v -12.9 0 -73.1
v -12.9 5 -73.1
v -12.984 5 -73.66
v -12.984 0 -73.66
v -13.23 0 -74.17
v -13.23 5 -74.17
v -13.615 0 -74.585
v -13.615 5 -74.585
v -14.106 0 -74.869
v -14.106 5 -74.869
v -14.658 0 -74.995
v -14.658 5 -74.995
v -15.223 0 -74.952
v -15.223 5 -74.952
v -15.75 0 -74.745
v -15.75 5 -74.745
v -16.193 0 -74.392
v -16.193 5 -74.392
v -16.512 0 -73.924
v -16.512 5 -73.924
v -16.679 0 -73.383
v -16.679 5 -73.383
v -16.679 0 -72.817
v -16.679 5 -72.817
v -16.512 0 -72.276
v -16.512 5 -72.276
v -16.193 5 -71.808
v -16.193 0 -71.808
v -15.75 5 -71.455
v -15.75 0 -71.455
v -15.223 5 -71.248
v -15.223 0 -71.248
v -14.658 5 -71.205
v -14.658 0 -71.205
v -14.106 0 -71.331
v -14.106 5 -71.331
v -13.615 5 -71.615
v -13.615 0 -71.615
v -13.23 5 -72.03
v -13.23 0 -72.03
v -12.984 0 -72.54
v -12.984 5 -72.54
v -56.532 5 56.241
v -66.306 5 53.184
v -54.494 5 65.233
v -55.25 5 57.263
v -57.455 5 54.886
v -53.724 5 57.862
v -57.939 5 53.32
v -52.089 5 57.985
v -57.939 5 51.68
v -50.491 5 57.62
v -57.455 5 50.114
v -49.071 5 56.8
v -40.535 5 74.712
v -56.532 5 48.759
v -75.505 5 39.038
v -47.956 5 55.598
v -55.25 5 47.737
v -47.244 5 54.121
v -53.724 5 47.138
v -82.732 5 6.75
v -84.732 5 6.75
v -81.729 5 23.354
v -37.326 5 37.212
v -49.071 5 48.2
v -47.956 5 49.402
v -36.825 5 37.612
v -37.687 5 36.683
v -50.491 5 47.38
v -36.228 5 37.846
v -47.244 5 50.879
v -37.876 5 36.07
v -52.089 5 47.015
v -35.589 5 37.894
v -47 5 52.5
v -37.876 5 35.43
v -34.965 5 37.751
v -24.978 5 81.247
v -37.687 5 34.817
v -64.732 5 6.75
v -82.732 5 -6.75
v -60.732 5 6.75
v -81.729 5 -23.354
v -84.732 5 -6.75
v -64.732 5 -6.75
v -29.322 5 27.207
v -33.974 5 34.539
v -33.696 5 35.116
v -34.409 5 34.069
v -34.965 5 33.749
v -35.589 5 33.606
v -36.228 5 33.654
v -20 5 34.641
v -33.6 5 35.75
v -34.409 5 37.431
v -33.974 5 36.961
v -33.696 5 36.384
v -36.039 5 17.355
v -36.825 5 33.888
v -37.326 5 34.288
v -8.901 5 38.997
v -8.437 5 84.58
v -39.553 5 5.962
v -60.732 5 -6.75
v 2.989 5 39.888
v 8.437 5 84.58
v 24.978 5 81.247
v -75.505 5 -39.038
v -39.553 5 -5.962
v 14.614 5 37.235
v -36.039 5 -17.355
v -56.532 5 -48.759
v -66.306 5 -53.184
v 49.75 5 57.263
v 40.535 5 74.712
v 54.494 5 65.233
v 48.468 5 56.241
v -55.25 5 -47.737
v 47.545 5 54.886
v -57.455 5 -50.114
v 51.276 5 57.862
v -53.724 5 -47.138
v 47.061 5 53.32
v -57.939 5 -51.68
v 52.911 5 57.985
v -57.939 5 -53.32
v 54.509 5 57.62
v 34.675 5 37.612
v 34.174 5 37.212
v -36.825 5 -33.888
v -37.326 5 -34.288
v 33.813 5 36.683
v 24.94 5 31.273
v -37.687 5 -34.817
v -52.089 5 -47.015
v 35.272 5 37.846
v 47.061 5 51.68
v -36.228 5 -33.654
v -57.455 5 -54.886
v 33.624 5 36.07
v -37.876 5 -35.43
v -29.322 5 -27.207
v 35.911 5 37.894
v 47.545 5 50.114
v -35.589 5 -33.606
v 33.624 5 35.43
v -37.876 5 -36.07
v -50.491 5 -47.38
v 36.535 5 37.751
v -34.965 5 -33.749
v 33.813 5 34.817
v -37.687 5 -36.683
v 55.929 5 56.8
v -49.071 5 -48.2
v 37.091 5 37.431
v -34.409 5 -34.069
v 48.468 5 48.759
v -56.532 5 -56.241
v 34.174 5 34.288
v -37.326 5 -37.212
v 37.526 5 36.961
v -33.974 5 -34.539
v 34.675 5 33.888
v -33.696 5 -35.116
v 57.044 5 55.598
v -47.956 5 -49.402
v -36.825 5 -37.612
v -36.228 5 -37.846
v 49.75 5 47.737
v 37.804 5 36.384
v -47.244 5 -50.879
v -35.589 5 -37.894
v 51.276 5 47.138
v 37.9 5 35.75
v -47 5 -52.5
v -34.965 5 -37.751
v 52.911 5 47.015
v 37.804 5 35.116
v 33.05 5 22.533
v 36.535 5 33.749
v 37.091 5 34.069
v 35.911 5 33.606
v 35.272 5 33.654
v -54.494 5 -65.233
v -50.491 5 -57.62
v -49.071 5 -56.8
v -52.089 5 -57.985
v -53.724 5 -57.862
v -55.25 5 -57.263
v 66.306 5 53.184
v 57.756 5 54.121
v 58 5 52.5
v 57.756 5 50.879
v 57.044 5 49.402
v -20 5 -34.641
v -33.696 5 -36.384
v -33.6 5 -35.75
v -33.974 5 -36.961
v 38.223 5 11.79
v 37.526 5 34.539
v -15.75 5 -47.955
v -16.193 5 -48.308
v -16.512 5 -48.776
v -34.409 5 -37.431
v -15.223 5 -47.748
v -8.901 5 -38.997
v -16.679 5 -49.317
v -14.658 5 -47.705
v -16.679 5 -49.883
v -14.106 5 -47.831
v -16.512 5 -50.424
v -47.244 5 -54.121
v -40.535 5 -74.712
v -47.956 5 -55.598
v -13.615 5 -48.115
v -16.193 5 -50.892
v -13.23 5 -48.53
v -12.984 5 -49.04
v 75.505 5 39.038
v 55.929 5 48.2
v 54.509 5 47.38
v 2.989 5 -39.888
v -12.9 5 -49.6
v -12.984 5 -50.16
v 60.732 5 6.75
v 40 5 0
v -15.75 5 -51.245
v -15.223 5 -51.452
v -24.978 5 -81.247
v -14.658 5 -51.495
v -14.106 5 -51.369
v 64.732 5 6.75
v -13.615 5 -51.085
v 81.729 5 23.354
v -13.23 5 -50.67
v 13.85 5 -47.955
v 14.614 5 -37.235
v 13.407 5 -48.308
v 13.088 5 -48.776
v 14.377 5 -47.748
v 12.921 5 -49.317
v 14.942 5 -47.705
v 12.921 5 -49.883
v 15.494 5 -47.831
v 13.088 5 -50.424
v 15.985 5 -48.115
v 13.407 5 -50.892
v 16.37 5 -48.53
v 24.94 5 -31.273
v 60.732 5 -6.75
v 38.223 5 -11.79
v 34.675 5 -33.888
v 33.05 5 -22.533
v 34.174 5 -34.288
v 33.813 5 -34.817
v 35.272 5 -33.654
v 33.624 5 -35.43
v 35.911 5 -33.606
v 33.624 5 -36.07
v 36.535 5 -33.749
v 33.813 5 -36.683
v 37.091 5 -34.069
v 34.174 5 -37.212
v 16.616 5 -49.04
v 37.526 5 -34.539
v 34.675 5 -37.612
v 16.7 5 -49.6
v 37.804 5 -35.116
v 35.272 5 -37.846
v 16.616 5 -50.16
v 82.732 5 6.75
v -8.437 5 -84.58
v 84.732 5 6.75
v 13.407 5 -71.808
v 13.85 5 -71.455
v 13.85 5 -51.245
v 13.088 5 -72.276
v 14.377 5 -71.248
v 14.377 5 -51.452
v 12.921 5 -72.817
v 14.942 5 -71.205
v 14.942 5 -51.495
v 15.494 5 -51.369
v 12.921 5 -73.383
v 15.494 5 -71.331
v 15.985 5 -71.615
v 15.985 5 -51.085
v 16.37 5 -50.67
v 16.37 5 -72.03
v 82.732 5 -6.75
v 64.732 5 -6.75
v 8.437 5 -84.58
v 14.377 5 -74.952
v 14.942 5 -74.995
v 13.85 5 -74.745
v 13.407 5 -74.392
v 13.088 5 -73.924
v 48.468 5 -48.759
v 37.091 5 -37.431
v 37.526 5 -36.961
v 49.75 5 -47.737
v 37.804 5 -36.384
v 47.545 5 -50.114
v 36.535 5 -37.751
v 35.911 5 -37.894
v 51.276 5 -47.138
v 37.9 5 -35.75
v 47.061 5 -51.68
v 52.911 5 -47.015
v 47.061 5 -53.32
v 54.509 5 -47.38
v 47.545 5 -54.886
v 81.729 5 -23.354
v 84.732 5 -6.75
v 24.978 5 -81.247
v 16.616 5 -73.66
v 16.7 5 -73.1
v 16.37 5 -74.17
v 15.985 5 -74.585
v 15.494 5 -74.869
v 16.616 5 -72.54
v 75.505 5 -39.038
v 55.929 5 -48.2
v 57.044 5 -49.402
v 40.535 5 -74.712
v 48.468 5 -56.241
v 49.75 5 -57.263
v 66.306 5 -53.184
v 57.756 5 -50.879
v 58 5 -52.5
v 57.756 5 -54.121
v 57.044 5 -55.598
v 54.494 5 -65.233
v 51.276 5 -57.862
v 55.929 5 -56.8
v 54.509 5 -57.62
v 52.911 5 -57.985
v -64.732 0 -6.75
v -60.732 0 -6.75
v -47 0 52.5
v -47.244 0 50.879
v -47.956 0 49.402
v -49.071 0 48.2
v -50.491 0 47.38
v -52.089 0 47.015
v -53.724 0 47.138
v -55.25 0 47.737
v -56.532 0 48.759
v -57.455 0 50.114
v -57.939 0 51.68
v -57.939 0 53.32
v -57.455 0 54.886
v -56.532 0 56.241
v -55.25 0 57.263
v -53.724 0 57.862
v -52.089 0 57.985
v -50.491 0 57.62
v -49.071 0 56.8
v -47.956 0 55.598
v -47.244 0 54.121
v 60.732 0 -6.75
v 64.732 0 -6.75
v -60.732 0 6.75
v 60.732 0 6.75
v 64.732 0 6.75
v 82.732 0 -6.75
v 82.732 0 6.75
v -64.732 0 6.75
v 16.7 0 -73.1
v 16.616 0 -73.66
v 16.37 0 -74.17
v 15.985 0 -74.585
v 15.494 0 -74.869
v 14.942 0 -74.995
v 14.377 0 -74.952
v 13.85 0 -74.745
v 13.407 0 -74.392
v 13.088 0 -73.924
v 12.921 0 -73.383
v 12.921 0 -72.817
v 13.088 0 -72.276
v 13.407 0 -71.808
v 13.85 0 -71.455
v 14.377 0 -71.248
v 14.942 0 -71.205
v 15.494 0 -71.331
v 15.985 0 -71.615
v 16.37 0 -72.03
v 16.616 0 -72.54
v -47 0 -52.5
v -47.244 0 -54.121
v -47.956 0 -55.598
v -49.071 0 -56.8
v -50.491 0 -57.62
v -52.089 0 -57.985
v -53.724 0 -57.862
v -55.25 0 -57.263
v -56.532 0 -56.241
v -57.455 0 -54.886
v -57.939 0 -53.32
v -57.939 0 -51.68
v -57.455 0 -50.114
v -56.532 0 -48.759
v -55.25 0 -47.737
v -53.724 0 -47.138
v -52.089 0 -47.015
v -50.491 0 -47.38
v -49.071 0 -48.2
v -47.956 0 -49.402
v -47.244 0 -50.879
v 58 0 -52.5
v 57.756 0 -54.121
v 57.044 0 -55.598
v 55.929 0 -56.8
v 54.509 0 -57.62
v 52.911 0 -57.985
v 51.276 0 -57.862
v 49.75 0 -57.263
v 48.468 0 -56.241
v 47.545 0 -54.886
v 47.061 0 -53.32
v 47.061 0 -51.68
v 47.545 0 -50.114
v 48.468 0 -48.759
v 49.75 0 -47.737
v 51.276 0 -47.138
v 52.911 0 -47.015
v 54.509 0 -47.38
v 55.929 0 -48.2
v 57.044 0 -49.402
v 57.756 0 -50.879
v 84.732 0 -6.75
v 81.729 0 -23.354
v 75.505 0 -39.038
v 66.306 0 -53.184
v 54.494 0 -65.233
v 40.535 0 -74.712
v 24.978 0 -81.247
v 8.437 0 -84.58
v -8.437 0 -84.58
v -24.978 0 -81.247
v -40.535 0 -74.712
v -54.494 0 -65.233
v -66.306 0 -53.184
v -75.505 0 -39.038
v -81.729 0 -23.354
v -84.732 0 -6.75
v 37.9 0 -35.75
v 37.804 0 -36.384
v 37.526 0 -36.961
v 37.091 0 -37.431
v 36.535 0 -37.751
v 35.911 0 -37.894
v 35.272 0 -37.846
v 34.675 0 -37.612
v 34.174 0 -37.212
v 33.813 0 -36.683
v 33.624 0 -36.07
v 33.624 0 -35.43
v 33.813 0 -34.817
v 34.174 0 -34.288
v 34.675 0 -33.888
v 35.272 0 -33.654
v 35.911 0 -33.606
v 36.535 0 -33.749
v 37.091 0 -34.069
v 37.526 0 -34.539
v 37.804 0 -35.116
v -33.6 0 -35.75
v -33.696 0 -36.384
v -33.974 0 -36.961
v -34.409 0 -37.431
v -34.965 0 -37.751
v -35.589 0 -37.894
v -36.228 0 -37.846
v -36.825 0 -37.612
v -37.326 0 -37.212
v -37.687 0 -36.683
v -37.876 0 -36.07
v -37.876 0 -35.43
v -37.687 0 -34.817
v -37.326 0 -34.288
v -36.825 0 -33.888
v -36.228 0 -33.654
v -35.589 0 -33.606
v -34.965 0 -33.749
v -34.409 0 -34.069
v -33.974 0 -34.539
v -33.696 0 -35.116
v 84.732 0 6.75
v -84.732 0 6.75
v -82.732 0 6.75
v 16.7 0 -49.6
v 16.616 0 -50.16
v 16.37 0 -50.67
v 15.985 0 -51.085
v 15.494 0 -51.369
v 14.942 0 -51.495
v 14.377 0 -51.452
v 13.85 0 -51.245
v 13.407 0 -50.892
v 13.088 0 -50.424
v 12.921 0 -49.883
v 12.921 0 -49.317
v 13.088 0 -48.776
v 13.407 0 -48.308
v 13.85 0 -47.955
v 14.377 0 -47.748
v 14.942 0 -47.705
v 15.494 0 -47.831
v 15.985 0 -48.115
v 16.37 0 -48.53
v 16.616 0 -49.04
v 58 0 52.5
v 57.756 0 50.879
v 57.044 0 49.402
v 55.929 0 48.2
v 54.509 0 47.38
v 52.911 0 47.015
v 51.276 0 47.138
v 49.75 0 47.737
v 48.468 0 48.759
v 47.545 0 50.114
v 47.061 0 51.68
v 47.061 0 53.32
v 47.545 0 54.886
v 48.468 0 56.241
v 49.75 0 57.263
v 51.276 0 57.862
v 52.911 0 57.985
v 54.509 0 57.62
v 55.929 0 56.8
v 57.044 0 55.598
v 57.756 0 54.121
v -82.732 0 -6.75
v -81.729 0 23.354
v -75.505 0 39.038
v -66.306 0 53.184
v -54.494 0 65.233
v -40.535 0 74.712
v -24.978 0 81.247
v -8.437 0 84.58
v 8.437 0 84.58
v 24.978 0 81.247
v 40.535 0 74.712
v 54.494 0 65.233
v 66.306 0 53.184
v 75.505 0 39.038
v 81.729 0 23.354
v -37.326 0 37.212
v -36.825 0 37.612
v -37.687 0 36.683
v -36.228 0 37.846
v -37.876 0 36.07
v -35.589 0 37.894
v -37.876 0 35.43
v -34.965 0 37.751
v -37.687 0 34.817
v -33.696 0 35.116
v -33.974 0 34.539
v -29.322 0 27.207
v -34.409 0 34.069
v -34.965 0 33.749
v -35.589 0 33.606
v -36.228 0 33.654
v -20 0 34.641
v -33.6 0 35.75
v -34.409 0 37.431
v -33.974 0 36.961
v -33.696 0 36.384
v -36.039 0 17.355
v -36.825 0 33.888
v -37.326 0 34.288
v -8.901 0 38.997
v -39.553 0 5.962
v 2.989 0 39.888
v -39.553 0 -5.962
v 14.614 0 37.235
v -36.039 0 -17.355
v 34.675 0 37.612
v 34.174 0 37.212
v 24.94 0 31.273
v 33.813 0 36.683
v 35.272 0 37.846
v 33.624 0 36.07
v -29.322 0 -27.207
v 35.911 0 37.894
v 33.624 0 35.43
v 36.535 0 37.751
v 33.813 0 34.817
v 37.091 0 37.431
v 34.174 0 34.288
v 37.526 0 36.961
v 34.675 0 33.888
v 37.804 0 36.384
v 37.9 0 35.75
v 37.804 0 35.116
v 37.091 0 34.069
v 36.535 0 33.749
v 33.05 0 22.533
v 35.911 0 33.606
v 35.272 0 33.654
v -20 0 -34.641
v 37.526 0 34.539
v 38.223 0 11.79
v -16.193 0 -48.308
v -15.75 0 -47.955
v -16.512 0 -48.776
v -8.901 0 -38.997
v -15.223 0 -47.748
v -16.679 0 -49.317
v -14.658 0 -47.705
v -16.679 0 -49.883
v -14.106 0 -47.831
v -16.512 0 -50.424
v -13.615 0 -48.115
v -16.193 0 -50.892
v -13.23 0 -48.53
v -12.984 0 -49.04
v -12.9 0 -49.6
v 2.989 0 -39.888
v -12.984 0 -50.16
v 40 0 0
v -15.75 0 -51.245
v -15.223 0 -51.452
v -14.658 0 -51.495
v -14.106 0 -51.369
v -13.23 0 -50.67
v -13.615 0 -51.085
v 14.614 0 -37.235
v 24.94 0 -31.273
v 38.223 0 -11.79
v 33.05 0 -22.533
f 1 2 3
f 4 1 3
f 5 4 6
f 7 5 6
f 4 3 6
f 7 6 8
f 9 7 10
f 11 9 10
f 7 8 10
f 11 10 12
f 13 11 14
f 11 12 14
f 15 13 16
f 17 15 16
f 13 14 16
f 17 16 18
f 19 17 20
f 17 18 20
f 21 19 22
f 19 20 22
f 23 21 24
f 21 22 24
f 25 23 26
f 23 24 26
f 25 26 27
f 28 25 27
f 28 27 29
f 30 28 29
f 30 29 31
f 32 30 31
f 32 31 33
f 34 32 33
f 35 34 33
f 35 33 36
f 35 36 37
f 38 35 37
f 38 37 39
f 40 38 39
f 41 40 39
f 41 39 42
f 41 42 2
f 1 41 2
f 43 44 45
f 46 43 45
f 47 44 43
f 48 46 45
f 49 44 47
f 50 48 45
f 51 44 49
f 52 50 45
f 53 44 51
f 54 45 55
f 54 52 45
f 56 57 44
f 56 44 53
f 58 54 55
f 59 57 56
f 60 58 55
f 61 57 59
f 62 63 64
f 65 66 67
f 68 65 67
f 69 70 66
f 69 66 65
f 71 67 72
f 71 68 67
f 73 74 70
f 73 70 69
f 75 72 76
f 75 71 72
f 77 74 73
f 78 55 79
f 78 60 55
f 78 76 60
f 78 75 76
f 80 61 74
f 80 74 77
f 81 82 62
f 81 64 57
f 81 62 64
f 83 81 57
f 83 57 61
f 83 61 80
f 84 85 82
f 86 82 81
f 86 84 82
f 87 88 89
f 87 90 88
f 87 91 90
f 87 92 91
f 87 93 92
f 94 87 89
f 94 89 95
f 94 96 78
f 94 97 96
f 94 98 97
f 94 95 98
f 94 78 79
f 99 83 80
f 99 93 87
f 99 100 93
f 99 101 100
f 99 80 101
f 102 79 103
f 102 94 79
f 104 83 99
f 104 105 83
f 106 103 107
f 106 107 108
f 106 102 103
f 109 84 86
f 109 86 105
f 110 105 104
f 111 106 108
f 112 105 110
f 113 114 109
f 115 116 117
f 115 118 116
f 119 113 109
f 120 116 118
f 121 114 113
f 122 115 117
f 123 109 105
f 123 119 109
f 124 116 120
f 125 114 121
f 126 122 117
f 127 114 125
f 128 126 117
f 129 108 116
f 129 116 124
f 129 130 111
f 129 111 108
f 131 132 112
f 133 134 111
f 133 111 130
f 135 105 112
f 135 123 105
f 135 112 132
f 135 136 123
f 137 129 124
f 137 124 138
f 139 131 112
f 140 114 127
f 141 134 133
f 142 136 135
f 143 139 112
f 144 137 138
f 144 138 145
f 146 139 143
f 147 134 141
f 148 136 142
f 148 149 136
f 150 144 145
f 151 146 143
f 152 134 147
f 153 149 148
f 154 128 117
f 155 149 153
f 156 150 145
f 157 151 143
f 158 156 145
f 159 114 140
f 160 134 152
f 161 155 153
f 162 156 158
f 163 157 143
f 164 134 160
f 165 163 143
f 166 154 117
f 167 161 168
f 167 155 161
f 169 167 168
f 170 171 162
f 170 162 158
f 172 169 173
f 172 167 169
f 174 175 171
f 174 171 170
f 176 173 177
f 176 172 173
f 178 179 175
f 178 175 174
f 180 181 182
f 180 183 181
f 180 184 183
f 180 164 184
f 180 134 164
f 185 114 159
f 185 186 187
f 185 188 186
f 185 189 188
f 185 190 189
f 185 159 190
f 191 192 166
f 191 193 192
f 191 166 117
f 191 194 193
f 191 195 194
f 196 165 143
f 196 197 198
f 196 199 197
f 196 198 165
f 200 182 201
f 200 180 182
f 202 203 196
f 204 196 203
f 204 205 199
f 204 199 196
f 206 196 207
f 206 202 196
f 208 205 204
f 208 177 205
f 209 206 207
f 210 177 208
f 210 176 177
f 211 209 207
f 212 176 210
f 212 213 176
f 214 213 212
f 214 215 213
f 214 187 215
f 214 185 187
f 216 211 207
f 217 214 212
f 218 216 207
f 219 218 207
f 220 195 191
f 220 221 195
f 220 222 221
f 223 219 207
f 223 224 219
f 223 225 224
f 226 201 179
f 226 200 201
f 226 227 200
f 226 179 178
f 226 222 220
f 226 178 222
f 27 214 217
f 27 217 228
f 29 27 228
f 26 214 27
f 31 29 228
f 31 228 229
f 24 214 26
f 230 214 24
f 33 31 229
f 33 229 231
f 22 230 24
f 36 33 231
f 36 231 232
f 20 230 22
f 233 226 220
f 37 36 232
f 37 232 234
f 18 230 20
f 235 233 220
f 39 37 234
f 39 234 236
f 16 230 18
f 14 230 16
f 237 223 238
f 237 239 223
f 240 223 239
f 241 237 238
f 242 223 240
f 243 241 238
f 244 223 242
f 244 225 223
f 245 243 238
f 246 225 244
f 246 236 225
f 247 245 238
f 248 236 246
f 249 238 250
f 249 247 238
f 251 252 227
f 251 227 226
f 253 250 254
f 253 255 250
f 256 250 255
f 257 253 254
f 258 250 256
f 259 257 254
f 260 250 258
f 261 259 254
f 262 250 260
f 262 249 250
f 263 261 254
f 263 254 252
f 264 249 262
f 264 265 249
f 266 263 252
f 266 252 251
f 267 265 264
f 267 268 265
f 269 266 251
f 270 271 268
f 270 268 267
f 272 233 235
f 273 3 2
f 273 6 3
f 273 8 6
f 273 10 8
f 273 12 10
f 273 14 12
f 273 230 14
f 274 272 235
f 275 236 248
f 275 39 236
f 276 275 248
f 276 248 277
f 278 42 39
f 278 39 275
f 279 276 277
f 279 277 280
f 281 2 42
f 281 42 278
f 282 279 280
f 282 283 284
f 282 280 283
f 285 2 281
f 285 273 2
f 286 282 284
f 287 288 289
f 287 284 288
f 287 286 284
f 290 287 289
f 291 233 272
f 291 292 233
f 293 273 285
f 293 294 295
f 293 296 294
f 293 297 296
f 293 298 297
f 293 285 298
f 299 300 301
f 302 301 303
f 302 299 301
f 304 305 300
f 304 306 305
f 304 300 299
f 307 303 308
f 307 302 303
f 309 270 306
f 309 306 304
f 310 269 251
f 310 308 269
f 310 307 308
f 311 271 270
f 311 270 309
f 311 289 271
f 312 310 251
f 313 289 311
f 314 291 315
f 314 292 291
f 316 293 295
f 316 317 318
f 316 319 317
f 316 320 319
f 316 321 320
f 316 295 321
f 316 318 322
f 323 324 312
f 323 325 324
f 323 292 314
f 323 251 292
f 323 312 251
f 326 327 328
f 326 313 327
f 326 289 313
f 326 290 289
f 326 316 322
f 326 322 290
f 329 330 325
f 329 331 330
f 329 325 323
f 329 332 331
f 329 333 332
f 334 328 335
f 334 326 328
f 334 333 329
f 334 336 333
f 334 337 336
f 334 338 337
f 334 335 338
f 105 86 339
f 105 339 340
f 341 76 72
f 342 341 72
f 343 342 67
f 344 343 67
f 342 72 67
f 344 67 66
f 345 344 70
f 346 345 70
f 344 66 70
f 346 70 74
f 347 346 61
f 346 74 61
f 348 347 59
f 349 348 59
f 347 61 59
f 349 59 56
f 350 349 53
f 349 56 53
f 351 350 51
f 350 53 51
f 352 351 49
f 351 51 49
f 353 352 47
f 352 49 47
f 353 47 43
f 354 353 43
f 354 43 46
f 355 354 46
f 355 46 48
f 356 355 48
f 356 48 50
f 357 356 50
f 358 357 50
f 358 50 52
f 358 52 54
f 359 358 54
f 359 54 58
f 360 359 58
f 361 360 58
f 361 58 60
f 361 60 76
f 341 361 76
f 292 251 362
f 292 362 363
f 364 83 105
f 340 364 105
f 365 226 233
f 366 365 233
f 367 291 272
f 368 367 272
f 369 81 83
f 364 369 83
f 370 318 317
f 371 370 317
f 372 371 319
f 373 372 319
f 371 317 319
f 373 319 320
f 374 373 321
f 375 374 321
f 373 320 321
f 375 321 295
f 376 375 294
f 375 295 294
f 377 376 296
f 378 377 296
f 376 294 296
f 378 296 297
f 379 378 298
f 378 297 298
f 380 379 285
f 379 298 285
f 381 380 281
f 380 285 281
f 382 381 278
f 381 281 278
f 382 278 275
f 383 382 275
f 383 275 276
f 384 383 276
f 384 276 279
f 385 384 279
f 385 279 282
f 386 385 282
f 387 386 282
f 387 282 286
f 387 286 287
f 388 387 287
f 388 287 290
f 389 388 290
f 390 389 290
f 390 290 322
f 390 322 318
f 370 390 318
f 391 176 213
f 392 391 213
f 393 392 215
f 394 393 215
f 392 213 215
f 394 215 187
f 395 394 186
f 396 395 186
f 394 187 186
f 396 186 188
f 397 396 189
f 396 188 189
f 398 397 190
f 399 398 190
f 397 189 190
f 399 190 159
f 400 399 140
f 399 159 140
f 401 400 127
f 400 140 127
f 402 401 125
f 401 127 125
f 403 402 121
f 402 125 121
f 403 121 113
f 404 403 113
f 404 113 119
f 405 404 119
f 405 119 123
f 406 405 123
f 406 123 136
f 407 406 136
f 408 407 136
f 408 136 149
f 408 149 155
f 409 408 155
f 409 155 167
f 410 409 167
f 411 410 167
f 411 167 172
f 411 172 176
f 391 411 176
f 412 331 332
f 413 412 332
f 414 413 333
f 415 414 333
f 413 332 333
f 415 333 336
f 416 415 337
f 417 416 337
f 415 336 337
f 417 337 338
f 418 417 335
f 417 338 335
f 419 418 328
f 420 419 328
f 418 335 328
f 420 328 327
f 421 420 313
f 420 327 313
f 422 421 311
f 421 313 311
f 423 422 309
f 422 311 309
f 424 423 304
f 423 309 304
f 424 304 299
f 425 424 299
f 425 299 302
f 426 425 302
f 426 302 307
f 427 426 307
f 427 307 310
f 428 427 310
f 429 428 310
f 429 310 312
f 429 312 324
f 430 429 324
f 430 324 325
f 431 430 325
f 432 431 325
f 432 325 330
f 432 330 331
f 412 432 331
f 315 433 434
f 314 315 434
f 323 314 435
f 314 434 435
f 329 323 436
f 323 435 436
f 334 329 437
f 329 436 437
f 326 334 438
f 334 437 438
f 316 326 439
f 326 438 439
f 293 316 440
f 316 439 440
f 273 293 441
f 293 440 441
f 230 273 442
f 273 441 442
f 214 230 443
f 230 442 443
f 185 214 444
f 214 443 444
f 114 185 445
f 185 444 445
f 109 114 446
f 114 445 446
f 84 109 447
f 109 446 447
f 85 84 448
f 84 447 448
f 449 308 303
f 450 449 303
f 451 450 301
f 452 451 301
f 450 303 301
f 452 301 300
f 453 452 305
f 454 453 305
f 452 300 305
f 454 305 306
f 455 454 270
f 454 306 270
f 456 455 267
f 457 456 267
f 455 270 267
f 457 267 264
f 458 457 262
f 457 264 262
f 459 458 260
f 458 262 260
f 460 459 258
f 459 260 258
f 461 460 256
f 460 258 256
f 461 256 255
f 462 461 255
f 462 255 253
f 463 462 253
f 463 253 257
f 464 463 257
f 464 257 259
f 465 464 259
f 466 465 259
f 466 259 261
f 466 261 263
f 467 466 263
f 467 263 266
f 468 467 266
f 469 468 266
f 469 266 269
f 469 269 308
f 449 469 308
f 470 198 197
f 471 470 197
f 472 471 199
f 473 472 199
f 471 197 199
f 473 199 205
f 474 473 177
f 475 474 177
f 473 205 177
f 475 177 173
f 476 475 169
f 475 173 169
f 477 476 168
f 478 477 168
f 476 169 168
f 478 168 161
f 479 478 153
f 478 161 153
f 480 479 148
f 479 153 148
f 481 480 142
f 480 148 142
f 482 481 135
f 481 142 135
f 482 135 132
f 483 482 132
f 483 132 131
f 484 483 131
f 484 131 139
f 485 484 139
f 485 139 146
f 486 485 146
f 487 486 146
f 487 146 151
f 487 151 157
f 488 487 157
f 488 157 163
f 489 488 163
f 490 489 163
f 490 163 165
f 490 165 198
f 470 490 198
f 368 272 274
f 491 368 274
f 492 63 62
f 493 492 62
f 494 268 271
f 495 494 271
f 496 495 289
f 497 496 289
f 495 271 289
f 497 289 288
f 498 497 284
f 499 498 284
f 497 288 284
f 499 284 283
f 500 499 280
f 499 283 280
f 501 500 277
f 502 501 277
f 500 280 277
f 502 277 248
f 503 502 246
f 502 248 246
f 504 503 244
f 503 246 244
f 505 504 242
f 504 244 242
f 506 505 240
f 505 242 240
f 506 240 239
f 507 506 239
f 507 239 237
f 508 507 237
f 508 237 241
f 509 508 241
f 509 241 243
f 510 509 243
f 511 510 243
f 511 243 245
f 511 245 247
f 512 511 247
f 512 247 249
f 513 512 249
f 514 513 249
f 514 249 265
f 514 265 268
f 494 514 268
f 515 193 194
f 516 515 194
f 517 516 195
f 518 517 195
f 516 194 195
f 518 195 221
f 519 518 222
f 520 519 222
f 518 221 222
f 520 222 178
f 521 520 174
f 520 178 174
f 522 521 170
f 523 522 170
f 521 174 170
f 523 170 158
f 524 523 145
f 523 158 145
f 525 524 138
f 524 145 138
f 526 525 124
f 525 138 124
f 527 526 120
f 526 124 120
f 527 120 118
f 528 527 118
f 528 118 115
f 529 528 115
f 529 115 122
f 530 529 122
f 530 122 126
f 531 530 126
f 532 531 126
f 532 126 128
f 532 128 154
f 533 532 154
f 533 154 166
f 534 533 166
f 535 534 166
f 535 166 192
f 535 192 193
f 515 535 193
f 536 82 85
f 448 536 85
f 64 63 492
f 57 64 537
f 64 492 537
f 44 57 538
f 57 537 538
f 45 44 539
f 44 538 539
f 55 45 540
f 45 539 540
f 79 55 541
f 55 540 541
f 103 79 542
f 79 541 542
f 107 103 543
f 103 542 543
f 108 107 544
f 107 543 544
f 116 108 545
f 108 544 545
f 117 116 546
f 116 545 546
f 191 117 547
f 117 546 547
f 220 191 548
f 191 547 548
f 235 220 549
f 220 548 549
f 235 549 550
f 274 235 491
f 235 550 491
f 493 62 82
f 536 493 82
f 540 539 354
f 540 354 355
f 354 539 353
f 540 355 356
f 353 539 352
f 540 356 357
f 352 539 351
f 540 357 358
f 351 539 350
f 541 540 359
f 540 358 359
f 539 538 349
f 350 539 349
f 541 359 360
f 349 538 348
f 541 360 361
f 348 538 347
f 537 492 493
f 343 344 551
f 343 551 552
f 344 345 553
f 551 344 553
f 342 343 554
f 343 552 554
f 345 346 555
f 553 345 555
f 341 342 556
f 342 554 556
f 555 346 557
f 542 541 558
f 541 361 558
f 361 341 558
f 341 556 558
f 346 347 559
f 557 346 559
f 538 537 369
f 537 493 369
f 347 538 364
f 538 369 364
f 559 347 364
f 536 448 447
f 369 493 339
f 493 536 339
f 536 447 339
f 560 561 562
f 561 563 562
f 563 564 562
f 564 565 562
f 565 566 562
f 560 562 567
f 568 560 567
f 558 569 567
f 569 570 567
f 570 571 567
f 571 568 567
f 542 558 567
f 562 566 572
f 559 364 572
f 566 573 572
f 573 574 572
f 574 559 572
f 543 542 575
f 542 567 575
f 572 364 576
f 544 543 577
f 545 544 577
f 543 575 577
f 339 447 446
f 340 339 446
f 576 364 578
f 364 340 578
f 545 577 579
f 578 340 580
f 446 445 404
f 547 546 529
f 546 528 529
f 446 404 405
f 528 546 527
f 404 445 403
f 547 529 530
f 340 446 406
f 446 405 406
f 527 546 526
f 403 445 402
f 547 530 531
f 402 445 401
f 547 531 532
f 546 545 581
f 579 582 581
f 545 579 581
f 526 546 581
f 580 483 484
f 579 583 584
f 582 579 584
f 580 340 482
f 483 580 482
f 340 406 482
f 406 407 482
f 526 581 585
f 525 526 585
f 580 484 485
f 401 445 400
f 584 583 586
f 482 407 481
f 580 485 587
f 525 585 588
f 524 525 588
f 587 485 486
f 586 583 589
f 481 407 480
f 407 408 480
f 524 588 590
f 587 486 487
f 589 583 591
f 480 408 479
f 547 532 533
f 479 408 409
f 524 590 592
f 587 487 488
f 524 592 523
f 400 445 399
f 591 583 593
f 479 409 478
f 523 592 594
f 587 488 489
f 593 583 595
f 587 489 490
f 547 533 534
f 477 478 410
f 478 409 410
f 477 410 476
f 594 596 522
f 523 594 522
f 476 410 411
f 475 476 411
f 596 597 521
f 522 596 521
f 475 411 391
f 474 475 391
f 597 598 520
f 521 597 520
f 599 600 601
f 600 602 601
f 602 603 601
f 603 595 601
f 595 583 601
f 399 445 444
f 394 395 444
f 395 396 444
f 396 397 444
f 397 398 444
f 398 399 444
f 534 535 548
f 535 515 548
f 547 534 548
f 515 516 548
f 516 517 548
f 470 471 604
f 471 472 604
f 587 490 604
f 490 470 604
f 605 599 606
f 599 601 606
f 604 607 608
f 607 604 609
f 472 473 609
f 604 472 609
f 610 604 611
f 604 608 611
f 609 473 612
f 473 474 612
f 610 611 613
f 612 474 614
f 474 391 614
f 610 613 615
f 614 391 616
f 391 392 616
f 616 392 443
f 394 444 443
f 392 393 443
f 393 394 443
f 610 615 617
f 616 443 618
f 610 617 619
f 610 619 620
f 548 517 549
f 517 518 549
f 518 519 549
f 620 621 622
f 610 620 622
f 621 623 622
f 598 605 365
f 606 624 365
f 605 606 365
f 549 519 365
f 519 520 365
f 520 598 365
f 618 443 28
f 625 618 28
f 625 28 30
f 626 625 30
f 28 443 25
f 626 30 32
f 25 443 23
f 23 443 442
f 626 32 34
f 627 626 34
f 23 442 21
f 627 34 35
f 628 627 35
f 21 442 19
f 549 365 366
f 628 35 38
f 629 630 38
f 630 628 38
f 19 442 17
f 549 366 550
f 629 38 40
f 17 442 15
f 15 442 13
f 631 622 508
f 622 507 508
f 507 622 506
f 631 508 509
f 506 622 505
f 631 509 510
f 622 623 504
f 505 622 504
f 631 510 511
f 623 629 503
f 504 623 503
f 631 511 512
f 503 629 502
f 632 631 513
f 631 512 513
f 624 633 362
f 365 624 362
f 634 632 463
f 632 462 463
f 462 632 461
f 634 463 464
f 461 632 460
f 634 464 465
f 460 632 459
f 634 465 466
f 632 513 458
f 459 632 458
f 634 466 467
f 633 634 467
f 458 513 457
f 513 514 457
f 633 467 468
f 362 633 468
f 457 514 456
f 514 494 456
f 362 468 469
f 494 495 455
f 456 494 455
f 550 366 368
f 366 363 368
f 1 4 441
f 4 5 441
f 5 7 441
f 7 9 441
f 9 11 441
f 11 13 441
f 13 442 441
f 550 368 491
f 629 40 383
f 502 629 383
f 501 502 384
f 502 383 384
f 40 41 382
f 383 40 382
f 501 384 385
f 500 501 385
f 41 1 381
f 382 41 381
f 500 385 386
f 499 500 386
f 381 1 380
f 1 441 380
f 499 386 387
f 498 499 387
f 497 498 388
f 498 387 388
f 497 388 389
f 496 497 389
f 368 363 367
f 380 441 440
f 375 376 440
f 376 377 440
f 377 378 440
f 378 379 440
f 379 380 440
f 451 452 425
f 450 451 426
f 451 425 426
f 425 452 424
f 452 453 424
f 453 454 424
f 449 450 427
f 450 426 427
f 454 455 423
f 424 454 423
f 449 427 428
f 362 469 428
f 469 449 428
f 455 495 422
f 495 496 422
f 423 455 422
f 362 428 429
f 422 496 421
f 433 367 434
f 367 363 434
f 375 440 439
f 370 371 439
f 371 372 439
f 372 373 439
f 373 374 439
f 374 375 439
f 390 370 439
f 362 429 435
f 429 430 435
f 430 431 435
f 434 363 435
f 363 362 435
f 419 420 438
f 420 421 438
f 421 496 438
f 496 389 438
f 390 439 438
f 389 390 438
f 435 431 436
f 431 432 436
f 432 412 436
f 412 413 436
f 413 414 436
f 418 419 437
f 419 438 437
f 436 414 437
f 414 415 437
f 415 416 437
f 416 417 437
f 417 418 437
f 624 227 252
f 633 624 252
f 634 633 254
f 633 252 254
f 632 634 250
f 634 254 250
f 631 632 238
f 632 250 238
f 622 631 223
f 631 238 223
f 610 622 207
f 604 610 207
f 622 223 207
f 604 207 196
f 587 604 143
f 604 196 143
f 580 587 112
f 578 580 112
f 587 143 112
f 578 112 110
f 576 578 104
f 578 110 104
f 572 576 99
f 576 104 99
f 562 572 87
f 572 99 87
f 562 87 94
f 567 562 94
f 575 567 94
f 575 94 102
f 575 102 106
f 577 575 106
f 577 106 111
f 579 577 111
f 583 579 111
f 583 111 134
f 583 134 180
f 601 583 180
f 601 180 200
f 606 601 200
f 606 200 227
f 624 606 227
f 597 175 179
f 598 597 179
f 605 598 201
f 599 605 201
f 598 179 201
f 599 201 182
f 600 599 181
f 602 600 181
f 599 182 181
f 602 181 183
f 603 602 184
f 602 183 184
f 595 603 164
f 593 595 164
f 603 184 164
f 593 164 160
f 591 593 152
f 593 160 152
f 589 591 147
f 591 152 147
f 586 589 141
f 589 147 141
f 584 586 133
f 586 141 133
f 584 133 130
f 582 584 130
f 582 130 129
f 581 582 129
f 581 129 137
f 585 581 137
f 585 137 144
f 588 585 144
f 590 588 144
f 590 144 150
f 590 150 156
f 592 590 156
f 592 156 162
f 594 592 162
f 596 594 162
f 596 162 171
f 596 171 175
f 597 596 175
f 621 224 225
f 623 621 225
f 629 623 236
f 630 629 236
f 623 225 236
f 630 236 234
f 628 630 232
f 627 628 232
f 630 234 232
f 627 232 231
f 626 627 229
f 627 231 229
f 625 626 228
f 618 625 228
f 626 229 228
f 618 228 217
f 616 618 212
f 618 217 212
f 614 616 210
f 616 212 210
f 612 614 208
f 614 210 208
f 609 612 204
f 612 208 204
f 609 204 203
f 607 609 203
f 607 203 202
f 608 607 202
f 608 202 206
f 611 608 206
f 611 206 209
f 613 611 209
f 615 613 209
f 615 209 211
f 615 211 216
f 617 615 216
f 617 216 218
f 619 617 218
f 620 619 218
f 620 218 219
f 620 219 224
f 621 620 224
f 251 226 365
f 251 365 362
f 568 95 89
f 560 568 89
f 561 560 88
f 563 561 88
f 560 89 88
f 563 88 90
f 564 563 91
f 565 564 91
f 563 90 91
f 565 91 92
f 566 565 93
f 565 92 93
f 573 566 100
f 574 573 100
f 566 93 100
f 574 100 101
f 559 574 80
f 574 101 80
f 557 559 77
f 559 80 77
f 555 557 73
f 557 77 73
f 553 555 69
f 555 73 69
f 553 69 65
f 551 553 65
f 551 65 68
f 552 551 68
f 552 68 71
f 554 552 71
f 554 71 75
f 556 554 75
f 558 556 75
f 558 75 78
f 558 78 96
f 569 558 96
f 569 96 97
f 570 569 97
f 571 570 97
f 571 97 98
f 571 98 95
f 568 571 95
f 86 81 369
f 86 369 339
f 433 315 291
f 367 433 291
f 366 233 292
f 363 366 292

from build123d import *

# Parameters (mm, degrees)
SKETCH1_R               = 85
BASE_DEPTH              = 5
MAIN_WHEEL_SLOTS_REACH  = 7
SKETCH2_W               = 4
SKETCH2_H               = 13.5
F_3RD_WHEEL_HOLES_REACH = 7
SKETCH3_R               = 1.9
SKETCH6_R               = 2.15
FAN_SCREW_HOLES_DEPTH   = 6
SKETCH7_R               = 40
FAN_BLADE_HOLE_DEPTH    = 6
BOLT_HOLES_REACH        = 7
SKETCH8_R               = 5.5


with BuildPart() as part:
    # Sketch1 → Base (new body)
    with BuildSketch(Plane(origin=(0, 0, 0), x_dir=(1, 0, 0), z_dir=(0, 1, 0))):
        Circle(SKETCH1_R)
    extrude(amount=BASE_DEPTH)

    # Sketch2 → Main Wheel Slots (cut, up to next)
    with BuildSketch(Plane(origin=(0, 5, 0), x_dir=(1, 0, 0), z_dir=(0, 1, 0)), mode=Mode.PRIVATE) as main_wheel_slots_sk1:
        with Locations((62.731561416, 0)):
            Rectangle(SKETCH2_W, SKETCH2_H)
    main_wheel_slots_tool1 = extrude(main_wheel_slots_sk1.sketch, amount=-MAIN_WHEEL_SLOTS_REACH, mode=Mode.PRIVATE) & part.part
    add(main_wheel_slots_tool1.solids().sort_by_distance((62.731561, 5, 0))[0], mode=Mode.SUBTRACT)
    # Sketch2 → Main Wheel Slots (cut, up to next)
    with BuildSketch(Plane(origin=(0, 5, 0), x_dir=(1, 0, 0), z_dir=(0, 1, 0)), mode=Mode.PRIVATE) as main_wheel_slots_sk2:
        with BuildLine():
            ThreePointArc((85, 0), (84.932863841, 3.377667808), (84.731561416, 6.75))
            Line((84.731561416, 6.75), (82.731561416, 6.75))
            Line((82.731561416, 6.75), (82.731561416, -6.75))
            Line((82.731561416, -6.75), (84.731561416, -6.75))
            ThreePointArc((84.731561416, -6.75), (84.932863841, -3.377667808), (85, 0))
        make_face()
    main_wheel_slots_tool2 = extrude(main_wheel_slots_sk2.sketch, amount=-MAIN_WHEEL_SLOTS_REACH, mode=Mode.PRIVATE) & part.part
    add(main_wheel_slots_tool2.solids().sort_by_distance((83.822538, 5, 0))[0], mode=Mode.SUBTRACT)
    # Sketch2 → Main Wheel Slots (cut, up to next)
    with BuildSketch(Plane(origin=(0, 5, 0), x_dir=(1, 0, 0), z_dir=(0, 1, 0)), mode=Mode.PRIVATE) as main_wheel_slots_sk3:
        with BuildLine():
            Line((-82.731561416, 6.75), (-84.731561416, 6.75))
            ThreePointArc((-84.731561416, 6.75), (-85, 0), (-84.731561416, -6.75))
            Line((-84.731561416, -6.75), (-82.731561416, -6.75))
            Line((-82.731561416, -6.75), (-82.731561416, 6.75))
        make_face()
    main_wheel_slots_tool3 = extrude(main_wheel_slots_sk3.sketch, amount=-MAIN_WHEEL_SLOTS_REACH, mode=Mode.PRIVATE) & part.part
    add(main_wheel_slots_tool3.solids().sort_by_distance((-83.822538, 5, 0))[0], mode=Mode.SUBTRACT)
    # Sketch2 → Main Wheel Slots (cut, up to next)
    with BuildSketch(Plane(origin=(0, 5, 0), x_dir=(1, 0, 0), z_dir=(0, 1, 0)), mode=Mode.PRIVATE) as main_wheel_slots_sk4:
        with Locations((-62.731561416, 0)):
            Rectangle(SKETCH2_W, SKETCH2_H)
    main_wheel_slots_tool4 = extrude(main_wheel_slots_sk4.sketch, amount=-MAIN_WHEEL_SLOTS_REACH, mode=Mode.PRIVATE) & part.part
    add(main_wheel_slots_tool4.solids().sort_by_distance((-62.731561, 5, 0))[0], mode=Mode.SUBTRACT)

    # Sketch3 → 3rd Wheel Holes (cut, up to next)
    with BuildSketch(Plane(origin=(0, 5, 0), x_dir=(1, 0, 0), z_dir=(0, 1, 0)), mode=Mode.PRIVATE) as f_3rd_wheel_holes_sk1:
        with Locations((14.8, 73.1)):
            Circle(SKETCH3_R)
    f_3rd_wheel_holes_tool1 = extrude(f_3rd_wheel_holes_sk1.sketch, amount=-F_3RD_WHEEL_HOLES_REACH, mode=Mode.PRIVATE) & part.part
    add(f_3rd_wheel_holes_tool1.solids().sort_by_distance((14.8, 5, -73.1))[0], mode=Mode.SUBTRACT)
    # Sketch3 → 3rd Wheel Holes (cut, up to next)
    with BuildSketch(Plane(origin=(0, 5, 0), x_dir=(1, 0, 0), z_dir=(0, 1, 0)), mode=Mode.PRIVATE) as f_3rd_wheel_holes_sk2:
        with Locations((14.8, 49.6)):
            Circle(SKETCH3_R)
    f_3rd_wheel_holes_tool2 = extrude(f_3rd_wheel_holes_sk2.sketch, amount=-F_3RD_WHEEL_HOLES_REACH, mode=Mode.PRIVATE) & part.part
    add(f_3rd_wheel_holes_tool2.solids().sort_by_distance((14.8, 5, -49.6))[0], mode=Mode.SUBTRACT)
    # Sketch3 → 3rd Wheel Holes (cut, up to next)
    with BuildSketch(Plane(origin=(0, 5, 0), x_dir=(1, 0, 0), z_dir=(0, 1, 0)), mode=Mode.PRIVATE) as f_3rd_wheel_holes_sk3:
        with Locations((-14.8, 49.6)):
            Circle(SKETCH3_R)
    f_3rd_wheel_holes_tool3 = extrude(f_3rd_wheel_holes_sk3.sketch, amount=-F_3RD_WHEEL_HOLES_REACH, mode=Mode.PRIVATE) & part.part
    add(f_3rd_wheel_holes_tool3.solids().sort_by_distance((-14.8, 5, -49.6))[0], mode=Mode.SUBTRACT)
    # Sketch3 → 3rd Wheel Holes (cut, up to next)
    with BuildSketch(Plane(origin=(0, 5, 0), x_dir=(1, 0, 0), z_dir=(0, 1, 0)), mode=Mode.PRIVATE) as f_3rd_wheel_holes_sk4:
        with Locations((-14.8, 73.1)):
            Circle(SKETCH3_R)
    f_3rd_wheel_holes_tool4 = extrude(f_3rd_wheel_holes_sk4.sketch, amount=-F_3RD_WHEEL_HOLES_REACH, mode=Mode.PRIVATE) & part.part
    add(f_3rd_wheel_holes_tool4.solids().sort_by_distance((-14.8, 5, -73.1))[0], mode=Mode.SUBTRACT)

    # Sketch6 → Fan Screw Holes (cut)
    with BuildSketch(Plane(origin=(0, 5, 0), x_dir=(1, 0, 0), z_dir=(0, 1, 0))):
        with Locations((35.75, 35.75)):
            Circle(SKETCH6_R)
        with Locations((-35.75, 35.75)):
            Circle(SKETCH6_R)
        with Locations((35.75, -35.75)):
            Circle(SKETCH6_R)
        with Locations((-35.75, -35.75)):
            Circle(SKETCH6_R)
    extrude(amount=-FAN_SCREW_HOLES_DEPTH, mode=Mode.SUBTRACT)

    # Sketch7 → Fan Blade Hole (cut)
    with BuildSketch(Plane(origin=(0, 5, 0), x_dir=(1, 0, 0), z_dir=(0, 1, 0))):
        Circle(SKETCH7_R)
    extrude(amount=-FAN_BLADE_HOLE_DEPTH, mode=Mode.SUBTRACT)

    # Sketch8 → Bolt Holes (cut, up to next)
    with BuildSketch(Plane(origin=(0, 5, 0), x_dir=(1, 0, 0), z_dir=(0, 1, 0)), mode=Mode.PRIVATE) as bolt_holes_sk1:
        with Locations((52.5, 52.5)):
            Circle(SKETCH8_R)
    bolt_holes_tool1 = extrude(bolt_holes_sk1.sketch, amount=-BOLT_HOLES_REACH, mode=Mode.PRIVATE) & part.part
    add(bolt_holes_tool1.solids().sort_by_distance((52.5, 5, -52.5))[0], mode=Mode.SUBTRACT)
    # Sketch8 → Bolt Holes (cut, up to next)
    with BuildSketch(Plane(origin=(0, 5, 0), x_dir=(1, 0, 0), z_dir=(0, 1, 0)), mode=Mode.PRIVATE) as bolt_holes_sk2:
        with Locations((-52.5, 52.5)):
            Circle(SKETCH8_R)
    bolt_holes_tool2 = extrude(bolt_holes_sk2.sketch, amount=-BOLT_HOLES_REACH, mode=Mode.PRIVATE) & part.part
    add(bolt_holes_tool2.solids().sort_by_distance((-52.5, 5, -52.5))[0], mode=Mode.SUBTRACT)
    # Sketch8 → Bolt Holes (cut, up to next)
    with BuildSketch(Plane(origin=(0, 5, 0), x_dir=(1, 0, 0), z_dir=(0, 1, 0)), mode=Mode.PRIVATE) as bolt_holes_sk3:
        with Locations((52.5, -52.5)):
            Circle(SKETCH8_R)
    bolt_holes_tool3 = extrude(bolt_holes_sk3.sketch, amount=-BOLT_HOLES_REACH, mode=Mode.PRIVATE) & part.part
    add(bolt_holes_tool3.solids().sort_by_distance((52.5, 5, 52.5))[0], mode=Mode.SUBTRACT)
    # Sketch8 → Bolt Holes (cut, up to next)
    with BuildSketch(Plane(origin=(0, 5, 0), x_dir=(1, 0, 0), z_dir=(0, 1, 0)), mode=Mode.PRIVATE) as bolt_holes_sk4:
        with Locations((-52.5, -52.5)):
            Circle(SKETCH8_R)
    bolt_holes_tool4 = extrude(bolt_holes_sk4.sketch, amount=-BOLT_HOLES_REACH, mode=Mode.PRIVATE) & part.part
    add(bolt_holes_tool4.solids().sort_by_distance((-52.5, 5, 52.5))[0], mode=Mode.SUBTRACT)


solid = part.part
